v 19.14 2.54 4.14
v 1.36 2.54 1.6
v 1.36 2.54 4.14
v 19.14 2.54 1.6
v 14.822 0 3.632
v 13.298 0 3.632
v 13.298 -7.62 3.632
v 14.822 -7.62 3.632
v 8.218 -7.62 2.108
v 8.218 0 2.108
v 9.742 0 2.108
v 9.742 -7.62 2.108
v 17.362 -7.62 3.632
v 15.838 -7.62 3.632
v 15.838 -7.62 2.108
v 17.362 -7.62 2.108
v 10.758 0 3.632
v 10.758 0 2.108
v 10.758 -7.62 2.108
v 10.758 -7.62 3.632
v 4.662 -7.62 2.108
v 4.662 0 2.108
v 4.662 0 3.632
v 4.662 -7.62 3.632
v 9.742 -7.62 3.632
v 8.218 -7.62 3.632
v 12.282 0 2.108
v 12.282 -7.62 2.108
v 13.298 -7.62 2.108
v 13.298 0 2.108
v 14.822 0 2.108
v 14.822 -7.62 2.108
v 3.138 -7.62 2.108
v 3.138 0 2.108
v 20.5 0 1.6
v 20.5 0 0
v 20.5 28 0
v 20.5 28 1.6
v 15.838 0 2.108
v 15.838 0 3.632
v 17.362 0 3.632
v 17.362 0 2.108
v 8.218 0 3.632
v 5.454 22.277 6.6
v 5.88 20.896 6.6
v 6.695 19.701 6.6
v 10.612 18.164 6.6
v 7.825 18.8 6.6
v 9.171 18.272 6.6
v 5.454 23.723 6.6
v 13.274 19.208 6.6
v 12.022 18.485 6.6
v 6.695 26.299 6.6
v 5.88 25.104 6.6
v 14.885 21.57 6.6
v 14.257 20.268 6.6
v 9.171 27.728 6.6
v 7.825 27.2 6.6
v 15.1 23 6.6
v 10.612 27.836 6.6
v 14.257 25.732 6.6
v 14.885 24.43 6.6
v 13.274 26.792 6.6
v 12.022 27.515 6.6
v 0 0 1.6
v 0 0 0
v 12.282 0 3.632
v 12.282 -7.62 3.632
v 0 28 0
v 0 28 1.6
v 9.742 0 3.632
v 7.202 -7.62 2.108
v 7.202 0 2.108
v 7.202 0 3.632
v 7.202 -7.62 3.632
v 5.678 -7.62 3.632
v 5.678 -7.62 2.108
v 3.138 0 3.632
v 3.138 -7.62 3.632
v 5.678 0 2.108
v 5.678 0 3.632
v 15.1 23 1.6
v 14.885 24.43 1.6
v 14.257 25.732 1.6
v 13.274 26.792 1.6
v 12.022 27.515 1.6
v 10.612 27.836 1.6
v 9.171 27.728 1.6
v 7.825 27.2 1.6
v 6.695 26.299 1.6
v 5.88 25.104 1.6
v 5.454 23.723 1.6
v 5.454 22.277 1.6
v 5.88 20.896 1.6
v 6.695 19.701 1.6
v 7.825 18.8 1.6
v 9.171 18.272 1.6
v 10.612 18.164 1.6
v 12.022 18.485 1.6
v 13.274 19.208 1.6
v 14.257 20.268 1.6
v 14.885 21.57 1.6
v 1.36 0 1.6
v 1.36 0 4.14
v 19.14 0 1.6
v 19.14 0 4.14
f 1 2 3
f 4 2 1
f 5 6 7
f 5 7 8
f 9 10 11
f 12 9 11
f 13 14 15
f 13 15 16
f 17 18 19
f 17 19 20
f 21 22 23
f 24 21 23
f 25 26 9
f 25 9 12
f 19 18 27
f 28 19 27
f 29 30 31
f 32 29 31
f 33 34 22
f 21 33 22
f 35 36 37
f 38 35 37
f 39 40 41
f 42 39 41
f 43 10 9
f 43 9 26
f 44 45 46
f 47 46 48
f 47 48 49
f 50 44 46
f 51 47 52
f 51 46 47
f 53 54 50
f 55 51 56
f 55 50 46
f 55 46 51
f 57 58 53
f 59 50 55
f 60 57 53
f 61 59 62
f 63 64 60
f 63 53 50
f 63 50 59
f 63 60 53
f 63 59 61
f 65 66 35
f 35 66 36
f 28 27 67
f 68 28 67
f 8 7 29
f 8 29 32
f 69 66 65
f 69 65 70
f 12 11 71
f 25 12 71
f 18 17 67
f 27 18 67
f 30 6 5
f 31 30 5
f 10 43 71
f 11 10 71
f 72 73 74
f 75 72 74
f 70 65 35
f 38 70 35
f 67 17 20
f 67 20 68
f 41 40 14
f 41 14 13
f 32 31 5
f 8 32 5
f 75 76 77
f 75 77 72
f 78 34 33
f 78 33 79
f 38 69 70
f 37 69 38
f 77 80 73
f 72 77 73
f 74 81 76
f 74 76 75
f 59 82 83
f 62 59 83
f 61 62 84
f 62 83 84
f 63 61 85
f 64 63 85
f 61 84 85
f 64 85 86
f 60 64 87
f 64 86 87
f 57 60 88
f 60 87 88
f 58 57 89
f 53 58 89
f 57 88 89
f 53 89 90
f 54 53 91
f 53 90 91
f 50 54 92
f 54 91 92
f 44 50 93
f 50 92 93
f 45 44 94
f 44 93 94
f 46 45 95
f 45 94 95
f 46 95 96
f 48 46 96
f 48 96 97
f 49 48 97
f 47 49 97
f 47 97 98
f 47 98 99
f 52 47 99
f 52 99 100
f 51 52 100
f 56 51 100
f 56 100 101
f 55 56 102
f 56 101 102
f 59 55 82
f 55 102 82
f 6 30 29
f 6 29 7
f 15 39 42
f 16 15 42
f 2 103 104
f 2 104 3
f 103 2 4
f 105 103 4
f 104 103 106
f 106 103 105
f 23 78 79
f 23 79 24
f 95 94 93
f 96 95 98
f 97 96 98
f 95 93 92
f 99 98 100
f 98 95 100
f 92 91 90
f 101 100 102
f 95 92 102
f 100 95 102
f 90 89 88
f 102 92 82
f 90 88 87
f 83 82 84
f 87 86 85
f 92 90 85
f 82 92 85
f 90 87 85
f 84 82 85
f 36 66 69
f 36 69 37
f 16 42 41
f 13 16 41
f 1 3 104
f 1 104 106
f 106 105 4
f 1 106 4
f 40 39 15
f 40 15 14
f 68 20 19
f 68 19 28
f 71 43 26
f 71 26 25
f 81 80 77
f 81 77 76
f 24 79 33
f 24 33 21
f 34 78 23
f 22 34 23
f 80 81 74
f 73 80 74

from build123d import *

# Parameters (mm, degrees)
SKETCH1_W             = 20.5
SKETCH1_H             = 28
BOSS_EXTRUDE1_DEPTH   = 1.6
SKETCH2_R             = 4.85
BOSS_EXTRUDE2_DEPTH   = 5
SKETCH3_W             = 17.78
SKETCH3_H             = 2.54
BOSS_EXTRUDE3_DEPTH   = 2.54
SKETCH4_W             = 1.524
SKETCH4_H             = 1.524
BOSS_EXTRUDE4_DEPTH   = 7.62
BOSS_EXTRUDE4_2_DEPTH = 7.62
BOSS_EXTRUDE4_3_DEPTH = 7.62
BOSS_EXTRUDE4_4_DEPTH = 7.62
BOSS_EXTRUDE4_5_DEPTH = 7.62
BOSS_EXTRUDE4_6_DEPTH = 7.62


with BuildPart() as part:
    # Sketch1 → Boss-Extrude1 (new body)
    with BuildSketch(Plane.XY):
        with Locations((10.25, 14)):
            Rectangle(SKETCH1_W, SKETCH1_H)
    extrude(amount=BOSS_EXTRUDE1_DEPTH)


with BuildPart() as body_2:
    # Sketch2 → Boss-Extrude2 (new body)
    with BuildSketch(Plane.XY.offset(1.6)):
        with Locations((10.25, 23)):
            Circle(SKETCH2_R)
    extrude(amount=BOSS_EXTRUDE2_DEPTH)


with BuildPart() as body_3:
    # Sketch3 → Boss-Extrude3 (new body)
    with BuildSketch(Plane.XY.offset(1.6)):
        with Locations((10.25, 1.27)):
            Rectangle(SKETCH3_W, SKETCH3_H)
    extrude(amount=BOSS_EXTRUDE3_DEPTH)


with BuildPart() as body_4:
    # Sketch4 → Boss-Extrude4 (new body)
    with BuildSketch(Plane.XZ):
        with Locations((3.9, 2.87)):
            Rectangle(SKETCH4_W, SKETCH4_H)
    extrude(amount=BOSS_EXTRUDE4_DEPTH)


with BuildPart() as body_5:
    # Sketch4 → Boss-Extrude4 2 (new body)
    with BuildSketch(Plane.XZ):
        with Locations((6.44, 2.87)):
            Rectangle(SKETCH4_W, SKETCH4_H)
    extrude(amount=BOSS_EXTRUDE4_2_DEPTH)


with BuildPart() as body_6:
    # Sketch4 → Boss-Extrude4 3 (new body)
    with BuildSketch(Plane.XZ):
        with Locations((8.98, 2.87)):
            Rectangle(SKETCH4_W, SKETCH4_H)
    extrude(amount=BOSS_EXTRUDE4_3_DEPTH)


with BuildPart() as body_7:
    # Sketch4 → Boss-Extrude4 4 (new body)
    with BuildSketch(Plane.XZ):
        with Locations((11.52, 2.87)):
            Rectangle(SKETCH4_W, SKETCH4_H)
    extrude(amount=BOSS_EXTRUDE4_4_DEPTH)


with BuildPart() as body_8:
    # Sketch4 → Boss-Extrude4 5 (new body)
    with BuildSketch(Plane.XZ):
        with Locations((14.06, 2.87)):
            Rectangle(SKETCH4_W, SKETCH4_H)
    extrude(amount=BOSS_EXTRUDE4_5_DEPTH)


with BuildPart() as body_9:
    # Sketch4 → Boss-Extrude4 6 (new body)
    with BuildSketch(Plane.XZ):
        with Locations((16.6, 2.87)):
            Rectangle(SKETCH4_W, SKETCH4_H)
    extrude(amount=BOSS_EXTRUDE4_6_DEPTH)


solid = Compound([part.part, body_2.part, body_3.part, body_4.part, body_5.part, body_6.part, body_7.part, body_8.part, body_9.part])
